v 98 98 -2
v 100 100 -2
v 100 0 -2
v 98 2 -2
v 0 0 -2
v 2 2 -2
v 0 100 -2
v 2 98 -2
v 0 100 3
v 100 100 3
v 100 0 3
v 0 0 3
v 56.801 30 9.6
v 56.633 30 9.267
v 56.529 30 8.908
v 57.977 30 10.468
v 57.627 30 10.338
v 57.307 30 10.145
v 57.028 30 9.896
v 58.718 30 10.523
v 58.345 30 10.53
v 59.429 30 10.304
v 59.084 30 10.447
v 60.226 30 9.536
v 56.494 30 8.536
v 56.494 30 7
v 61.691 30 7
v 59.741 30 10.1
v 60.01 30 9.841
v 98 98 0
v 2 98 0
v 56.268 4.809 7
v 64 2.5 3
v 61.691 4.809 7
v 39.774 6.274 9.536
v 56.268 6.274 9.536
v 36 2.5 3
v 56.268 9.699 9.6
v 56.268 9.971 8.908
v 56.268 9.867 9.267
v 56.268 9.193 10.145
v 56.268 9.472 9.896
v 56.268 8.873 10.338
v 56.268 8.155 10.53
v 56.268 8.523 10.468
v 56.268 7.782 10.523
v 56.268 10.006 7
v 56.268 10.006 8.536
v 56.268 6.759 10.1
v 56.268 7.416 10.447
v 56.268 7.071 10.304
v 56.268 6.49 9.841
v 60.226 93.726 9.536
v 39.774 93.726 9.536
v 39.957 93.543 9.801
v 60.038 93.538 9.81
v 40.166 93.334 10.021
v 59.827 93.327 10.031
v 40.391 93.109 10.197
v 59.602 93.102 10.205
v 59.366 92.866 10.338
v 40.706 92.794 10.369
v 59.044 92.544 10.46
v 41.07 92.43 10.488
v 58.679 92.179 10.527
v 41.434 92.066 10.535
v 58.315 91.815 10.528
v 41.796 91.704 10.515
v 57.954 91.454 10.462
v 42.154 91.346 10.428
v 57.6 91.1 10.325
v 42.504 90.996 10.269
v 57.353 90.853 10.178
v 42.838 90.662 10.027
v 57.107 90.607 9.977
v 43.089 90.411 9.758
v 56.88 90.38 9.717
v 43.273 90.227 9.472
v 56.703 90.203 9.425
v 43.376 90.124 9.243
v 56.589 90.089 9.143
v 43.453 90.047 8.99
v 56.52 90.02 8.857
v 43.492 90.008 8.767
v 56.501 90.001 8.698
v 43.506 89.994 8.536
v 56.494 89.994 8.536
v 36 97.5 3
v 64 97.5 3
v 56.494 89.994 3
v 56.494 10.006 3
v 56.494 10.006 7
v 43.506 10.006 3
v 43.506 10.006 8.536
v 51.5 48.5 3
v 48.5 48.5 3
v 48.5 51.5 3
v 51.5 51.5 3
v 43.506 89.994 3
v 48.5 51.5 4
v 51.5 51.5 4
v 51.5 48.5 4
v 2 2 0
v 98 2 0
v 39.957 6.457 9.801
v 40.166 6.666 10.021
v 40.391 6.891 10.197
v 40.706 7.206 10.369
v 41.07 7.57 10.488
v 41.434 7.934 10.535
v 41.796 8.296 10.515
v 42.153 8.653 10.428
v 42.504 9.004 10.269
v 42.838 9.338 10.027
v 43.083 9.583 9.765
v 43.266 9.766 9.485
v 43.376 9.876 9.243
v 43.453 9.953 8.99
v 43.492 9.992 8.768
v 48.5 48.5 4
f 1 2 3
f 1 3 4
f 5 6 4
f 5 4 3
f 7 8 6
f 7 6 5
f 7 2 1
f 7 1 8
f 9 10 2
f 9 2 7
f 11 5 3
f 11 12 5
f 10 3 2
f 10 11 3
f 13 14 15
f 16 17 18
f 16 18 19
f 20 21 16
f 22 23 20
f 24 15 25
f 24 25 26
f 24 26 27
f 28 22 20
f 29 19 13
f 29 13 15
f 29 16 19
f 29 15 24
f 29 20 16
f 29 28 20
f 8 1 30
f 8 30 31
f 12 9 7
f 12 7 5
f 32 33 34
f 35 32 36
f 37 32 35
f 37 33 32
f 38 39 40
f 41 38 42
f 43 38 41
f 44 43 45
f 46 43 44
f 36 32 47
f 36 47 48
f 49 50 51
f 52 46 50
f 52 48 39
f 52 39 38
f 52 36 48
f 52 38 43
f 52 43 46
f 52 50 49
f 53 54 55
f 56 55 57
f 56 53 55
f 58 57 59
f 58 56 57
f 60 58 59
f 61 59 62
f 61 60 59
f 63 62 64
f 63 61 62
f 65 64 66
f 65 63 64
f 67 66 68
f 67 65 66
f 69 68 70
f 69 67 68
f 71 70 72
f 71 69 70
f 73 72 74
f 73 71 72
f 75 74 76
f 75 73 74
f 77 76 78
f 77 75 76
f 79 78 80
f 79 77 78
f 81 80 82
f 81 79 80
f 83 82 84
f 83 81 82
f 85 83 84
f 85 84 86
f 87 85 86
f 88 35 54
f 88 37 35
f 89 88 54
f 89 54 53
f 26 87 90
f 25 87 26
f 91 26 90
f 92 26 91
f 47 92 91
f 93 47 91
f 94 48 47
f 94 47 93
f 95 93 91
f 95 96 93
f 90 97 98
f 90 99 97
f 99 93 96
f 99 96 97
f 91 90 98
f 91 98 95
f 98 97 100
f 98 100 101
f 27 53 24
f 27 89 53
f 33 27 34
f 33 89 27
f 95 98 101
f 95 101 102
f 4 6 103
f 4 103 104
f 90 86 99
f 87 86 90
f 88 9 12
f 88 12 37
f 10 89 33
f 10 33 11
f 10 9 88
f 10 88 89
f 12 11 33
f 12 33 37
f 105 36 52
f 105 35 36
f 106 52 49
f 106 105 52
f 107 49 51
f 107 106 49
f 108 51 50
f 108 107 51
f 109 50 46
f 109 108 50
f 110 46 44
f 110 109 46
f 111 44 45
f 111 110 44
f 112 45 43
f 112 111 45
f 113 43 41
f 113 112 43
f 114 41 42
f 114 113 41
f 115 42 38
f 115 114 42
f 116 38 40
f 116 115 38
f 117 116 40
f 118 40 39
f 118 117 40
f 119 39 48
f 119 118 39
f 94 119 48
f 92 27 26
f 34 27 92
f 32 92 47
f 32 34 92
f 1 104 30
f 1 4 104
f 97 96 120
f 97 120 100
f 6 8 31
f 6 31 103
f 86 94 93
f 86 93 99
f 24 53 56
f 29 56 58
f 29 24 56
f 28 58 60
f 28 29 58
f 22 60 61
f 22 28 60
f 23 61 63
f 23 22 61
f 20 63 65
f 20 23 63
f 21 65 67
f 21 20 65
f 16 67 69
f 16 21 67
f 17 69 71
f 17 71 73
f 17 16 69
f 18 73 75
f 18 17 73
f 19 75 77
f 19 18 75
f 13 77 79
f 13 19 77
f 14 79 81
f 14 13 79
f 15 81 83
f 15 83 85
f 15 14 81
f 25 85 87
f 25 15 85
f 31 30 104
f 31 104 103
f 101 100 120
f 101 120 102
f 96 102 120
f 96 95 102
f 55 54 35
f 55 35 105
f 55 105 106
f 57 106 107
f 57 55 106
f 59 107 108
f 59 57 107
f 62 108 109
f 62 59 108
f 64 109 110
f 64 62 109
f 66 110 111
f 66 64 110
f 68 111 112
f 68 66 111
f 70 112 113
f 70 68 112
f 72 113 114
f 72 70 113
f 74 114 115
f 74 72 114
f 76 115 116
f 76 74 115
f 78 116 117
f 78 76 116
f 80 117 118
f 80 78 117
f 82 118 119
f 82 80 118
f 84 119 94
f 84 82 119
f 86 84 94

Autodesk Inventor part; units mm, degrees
ref_plane "YZ Plane" through (0, 0, 0) normal (1, 0, 0) x (0, 1, 0)
ref_plane "XZ Plane" through (0, 0, 0) normal (0, 1, 0) x (-1, 0, 0)
ref_plane "XY Plane" through (0, 0, 0) normal (0, 0, 1) x (1, 0, 0)
sketch "Sketch1" plane through (0, 0, 0) normal (0, 0, 1) x (1, 0, 0)
  line L0 (0, 0) -> (100, 0)
  line L1 (100, 0) -> (100, 100)
  line L2 (100, 100) -> (0, 100)
  line L3 (0, 100) -> (0, 0)
  dimension "d0" = 100
  dimension "d1" = 100
extrude "Extrusion1" add sketch "Sketch1" along normal blind 3
sketch "Sketch2" plane through (0, 0, 3) normal (0, 0, 1) x (1, 0, 0)
  line L0 (36, 97.5) -> (64, 97.5)
  line L1 (64, 97.5) -> (64, 2.5)
  line L2 (64, 2.5) -> (36, 2.5)
  line L3 (36, 2.5) -> (36, 97.5)
  line L4 (0, 0) -> (100, 0) projected
  line L5 (0, 100) -> (0, 0) projected
  dimension "d6" = 28
  dimension "d7" = 95
  dimension "d8" = 2.5
  dimension "d9" = 36
extrude "Extrusion2" add sketch "Sketch2" along normal blind 13 draft -30
sketch "Sketch4" plane through (0, 0, 16) normal (0, 0, 1) x (1, 0, 0)
  line L0 (43.5056, 10.0056) -> (43.5056, 89.9944) projected
  line L1 (56.4944, 10.0056) -> (43.5056, 10.0056) projected
  line L2 (56.4944, 89.9944) -> (56.4944, 10.0056) projected
  line L3 (43.5056, 89.9944) -> (56.4944, 89.9944) projected
  point P0 (0, 0)
extrude "Extrusion3" cut sketch "Sketch4" against normal blind 13
sketch "Sketch5" plane through (0, 0, 0) normal (0, -1, 0) x (1, 0, 0)
  line L0 (56.4944, 16) -> (43.5056, 16) projected
  line L1 (43.5056, 16) -> (56.4944, 16) projected
  line L2 (56.2684, 16) -> (67.0318, 16)
  line L3 (67.0318, 16) -> (67.0318, 7)
  line L4 (67.0318, 7) -> (56.2684, 7)
  line L5 (56.2684, 7) -> (56.2684, 16)
  point P0 (0, 0)
  dimension "d14" = 9
fillet "Fillet1" radius 2 4 edges at (50, 10.0056, 16) (56.4944, 50, 16) (43.5056, 50, 16) (50, 89.9944, 16)
extrude "Extrusion4" cut sketch "Sketch5" against normal blind 30
sketch "Sketch6" plane through (0, 0, 0) normal (0, 0, -1) x (-1, 0, 0)
  line L0 (-100, 100) -> (0, 100) projected
  line L1 (0, 0) -> (-100, 0) projected
  line L2 (-100, 100) -> (0, 100)
  line L3 (0, 100) -> (0, 0)
  line L4 (0, 0) -> (-100, 0)
  line L5 (-100, 0) -> (-100, 100)
extrude "Extrusion5" add sketch "Sketch6" along normal blind 2
sketch "Sketch7" plane through (0, 0, -2) normal (0, 0, -1) x (-1, 0, 0)
  line L0 (-98, 98) -> (-2, 98)
  line L1 (-2, 98) -> (-2, 2)
  line L2 (-2, 2) -> (-98, 2)
  line L3 (-98, 2) -> (-98, 98)
  line L4 (0, 100) -> (-100, 100) projected
  line L5 (-100, 100) -> (-100, 0) projected
  line L6 (-100, 0) -> (0, 0) projected
  line L7 (0, 0) -> (0, 100) projected
  dimension "d19" = 2
  dimension "d20" = 2
  dimension "d21" = 2
  dimension "d22" = 2
extrude "Extrusion6" cut sketch "Sketch7" against normal blind 2 contours L0 L1 L2 L3
sketch "Sketch8" plane through (0, 0, 3) normal (0, 0, 1) x (1, 0, 0)
  line L0 (48.5, 51.5) -> (51.5, 51.5)
  line L1 (51.5, 51.5) -> (51.5, 48.5)
  line L2 (51.5, 48.5) -> (48.5, 48.5)
  line L3 (48.5, 48.5) -> (48.5, 51.5)
  line L4 (0, 100) -> (0, 0) projected
  line L5 (100, 100) -> (0, 100) projected
  dimension "d25" = 3
  dimension "d26" = 3
  dimension "d27" = 48.5
  dimension "d28" = 48.5
extrude "Extrusion7" add sketch "Sketch8" along normal blind 1
properties part number "Weight_Plate"
